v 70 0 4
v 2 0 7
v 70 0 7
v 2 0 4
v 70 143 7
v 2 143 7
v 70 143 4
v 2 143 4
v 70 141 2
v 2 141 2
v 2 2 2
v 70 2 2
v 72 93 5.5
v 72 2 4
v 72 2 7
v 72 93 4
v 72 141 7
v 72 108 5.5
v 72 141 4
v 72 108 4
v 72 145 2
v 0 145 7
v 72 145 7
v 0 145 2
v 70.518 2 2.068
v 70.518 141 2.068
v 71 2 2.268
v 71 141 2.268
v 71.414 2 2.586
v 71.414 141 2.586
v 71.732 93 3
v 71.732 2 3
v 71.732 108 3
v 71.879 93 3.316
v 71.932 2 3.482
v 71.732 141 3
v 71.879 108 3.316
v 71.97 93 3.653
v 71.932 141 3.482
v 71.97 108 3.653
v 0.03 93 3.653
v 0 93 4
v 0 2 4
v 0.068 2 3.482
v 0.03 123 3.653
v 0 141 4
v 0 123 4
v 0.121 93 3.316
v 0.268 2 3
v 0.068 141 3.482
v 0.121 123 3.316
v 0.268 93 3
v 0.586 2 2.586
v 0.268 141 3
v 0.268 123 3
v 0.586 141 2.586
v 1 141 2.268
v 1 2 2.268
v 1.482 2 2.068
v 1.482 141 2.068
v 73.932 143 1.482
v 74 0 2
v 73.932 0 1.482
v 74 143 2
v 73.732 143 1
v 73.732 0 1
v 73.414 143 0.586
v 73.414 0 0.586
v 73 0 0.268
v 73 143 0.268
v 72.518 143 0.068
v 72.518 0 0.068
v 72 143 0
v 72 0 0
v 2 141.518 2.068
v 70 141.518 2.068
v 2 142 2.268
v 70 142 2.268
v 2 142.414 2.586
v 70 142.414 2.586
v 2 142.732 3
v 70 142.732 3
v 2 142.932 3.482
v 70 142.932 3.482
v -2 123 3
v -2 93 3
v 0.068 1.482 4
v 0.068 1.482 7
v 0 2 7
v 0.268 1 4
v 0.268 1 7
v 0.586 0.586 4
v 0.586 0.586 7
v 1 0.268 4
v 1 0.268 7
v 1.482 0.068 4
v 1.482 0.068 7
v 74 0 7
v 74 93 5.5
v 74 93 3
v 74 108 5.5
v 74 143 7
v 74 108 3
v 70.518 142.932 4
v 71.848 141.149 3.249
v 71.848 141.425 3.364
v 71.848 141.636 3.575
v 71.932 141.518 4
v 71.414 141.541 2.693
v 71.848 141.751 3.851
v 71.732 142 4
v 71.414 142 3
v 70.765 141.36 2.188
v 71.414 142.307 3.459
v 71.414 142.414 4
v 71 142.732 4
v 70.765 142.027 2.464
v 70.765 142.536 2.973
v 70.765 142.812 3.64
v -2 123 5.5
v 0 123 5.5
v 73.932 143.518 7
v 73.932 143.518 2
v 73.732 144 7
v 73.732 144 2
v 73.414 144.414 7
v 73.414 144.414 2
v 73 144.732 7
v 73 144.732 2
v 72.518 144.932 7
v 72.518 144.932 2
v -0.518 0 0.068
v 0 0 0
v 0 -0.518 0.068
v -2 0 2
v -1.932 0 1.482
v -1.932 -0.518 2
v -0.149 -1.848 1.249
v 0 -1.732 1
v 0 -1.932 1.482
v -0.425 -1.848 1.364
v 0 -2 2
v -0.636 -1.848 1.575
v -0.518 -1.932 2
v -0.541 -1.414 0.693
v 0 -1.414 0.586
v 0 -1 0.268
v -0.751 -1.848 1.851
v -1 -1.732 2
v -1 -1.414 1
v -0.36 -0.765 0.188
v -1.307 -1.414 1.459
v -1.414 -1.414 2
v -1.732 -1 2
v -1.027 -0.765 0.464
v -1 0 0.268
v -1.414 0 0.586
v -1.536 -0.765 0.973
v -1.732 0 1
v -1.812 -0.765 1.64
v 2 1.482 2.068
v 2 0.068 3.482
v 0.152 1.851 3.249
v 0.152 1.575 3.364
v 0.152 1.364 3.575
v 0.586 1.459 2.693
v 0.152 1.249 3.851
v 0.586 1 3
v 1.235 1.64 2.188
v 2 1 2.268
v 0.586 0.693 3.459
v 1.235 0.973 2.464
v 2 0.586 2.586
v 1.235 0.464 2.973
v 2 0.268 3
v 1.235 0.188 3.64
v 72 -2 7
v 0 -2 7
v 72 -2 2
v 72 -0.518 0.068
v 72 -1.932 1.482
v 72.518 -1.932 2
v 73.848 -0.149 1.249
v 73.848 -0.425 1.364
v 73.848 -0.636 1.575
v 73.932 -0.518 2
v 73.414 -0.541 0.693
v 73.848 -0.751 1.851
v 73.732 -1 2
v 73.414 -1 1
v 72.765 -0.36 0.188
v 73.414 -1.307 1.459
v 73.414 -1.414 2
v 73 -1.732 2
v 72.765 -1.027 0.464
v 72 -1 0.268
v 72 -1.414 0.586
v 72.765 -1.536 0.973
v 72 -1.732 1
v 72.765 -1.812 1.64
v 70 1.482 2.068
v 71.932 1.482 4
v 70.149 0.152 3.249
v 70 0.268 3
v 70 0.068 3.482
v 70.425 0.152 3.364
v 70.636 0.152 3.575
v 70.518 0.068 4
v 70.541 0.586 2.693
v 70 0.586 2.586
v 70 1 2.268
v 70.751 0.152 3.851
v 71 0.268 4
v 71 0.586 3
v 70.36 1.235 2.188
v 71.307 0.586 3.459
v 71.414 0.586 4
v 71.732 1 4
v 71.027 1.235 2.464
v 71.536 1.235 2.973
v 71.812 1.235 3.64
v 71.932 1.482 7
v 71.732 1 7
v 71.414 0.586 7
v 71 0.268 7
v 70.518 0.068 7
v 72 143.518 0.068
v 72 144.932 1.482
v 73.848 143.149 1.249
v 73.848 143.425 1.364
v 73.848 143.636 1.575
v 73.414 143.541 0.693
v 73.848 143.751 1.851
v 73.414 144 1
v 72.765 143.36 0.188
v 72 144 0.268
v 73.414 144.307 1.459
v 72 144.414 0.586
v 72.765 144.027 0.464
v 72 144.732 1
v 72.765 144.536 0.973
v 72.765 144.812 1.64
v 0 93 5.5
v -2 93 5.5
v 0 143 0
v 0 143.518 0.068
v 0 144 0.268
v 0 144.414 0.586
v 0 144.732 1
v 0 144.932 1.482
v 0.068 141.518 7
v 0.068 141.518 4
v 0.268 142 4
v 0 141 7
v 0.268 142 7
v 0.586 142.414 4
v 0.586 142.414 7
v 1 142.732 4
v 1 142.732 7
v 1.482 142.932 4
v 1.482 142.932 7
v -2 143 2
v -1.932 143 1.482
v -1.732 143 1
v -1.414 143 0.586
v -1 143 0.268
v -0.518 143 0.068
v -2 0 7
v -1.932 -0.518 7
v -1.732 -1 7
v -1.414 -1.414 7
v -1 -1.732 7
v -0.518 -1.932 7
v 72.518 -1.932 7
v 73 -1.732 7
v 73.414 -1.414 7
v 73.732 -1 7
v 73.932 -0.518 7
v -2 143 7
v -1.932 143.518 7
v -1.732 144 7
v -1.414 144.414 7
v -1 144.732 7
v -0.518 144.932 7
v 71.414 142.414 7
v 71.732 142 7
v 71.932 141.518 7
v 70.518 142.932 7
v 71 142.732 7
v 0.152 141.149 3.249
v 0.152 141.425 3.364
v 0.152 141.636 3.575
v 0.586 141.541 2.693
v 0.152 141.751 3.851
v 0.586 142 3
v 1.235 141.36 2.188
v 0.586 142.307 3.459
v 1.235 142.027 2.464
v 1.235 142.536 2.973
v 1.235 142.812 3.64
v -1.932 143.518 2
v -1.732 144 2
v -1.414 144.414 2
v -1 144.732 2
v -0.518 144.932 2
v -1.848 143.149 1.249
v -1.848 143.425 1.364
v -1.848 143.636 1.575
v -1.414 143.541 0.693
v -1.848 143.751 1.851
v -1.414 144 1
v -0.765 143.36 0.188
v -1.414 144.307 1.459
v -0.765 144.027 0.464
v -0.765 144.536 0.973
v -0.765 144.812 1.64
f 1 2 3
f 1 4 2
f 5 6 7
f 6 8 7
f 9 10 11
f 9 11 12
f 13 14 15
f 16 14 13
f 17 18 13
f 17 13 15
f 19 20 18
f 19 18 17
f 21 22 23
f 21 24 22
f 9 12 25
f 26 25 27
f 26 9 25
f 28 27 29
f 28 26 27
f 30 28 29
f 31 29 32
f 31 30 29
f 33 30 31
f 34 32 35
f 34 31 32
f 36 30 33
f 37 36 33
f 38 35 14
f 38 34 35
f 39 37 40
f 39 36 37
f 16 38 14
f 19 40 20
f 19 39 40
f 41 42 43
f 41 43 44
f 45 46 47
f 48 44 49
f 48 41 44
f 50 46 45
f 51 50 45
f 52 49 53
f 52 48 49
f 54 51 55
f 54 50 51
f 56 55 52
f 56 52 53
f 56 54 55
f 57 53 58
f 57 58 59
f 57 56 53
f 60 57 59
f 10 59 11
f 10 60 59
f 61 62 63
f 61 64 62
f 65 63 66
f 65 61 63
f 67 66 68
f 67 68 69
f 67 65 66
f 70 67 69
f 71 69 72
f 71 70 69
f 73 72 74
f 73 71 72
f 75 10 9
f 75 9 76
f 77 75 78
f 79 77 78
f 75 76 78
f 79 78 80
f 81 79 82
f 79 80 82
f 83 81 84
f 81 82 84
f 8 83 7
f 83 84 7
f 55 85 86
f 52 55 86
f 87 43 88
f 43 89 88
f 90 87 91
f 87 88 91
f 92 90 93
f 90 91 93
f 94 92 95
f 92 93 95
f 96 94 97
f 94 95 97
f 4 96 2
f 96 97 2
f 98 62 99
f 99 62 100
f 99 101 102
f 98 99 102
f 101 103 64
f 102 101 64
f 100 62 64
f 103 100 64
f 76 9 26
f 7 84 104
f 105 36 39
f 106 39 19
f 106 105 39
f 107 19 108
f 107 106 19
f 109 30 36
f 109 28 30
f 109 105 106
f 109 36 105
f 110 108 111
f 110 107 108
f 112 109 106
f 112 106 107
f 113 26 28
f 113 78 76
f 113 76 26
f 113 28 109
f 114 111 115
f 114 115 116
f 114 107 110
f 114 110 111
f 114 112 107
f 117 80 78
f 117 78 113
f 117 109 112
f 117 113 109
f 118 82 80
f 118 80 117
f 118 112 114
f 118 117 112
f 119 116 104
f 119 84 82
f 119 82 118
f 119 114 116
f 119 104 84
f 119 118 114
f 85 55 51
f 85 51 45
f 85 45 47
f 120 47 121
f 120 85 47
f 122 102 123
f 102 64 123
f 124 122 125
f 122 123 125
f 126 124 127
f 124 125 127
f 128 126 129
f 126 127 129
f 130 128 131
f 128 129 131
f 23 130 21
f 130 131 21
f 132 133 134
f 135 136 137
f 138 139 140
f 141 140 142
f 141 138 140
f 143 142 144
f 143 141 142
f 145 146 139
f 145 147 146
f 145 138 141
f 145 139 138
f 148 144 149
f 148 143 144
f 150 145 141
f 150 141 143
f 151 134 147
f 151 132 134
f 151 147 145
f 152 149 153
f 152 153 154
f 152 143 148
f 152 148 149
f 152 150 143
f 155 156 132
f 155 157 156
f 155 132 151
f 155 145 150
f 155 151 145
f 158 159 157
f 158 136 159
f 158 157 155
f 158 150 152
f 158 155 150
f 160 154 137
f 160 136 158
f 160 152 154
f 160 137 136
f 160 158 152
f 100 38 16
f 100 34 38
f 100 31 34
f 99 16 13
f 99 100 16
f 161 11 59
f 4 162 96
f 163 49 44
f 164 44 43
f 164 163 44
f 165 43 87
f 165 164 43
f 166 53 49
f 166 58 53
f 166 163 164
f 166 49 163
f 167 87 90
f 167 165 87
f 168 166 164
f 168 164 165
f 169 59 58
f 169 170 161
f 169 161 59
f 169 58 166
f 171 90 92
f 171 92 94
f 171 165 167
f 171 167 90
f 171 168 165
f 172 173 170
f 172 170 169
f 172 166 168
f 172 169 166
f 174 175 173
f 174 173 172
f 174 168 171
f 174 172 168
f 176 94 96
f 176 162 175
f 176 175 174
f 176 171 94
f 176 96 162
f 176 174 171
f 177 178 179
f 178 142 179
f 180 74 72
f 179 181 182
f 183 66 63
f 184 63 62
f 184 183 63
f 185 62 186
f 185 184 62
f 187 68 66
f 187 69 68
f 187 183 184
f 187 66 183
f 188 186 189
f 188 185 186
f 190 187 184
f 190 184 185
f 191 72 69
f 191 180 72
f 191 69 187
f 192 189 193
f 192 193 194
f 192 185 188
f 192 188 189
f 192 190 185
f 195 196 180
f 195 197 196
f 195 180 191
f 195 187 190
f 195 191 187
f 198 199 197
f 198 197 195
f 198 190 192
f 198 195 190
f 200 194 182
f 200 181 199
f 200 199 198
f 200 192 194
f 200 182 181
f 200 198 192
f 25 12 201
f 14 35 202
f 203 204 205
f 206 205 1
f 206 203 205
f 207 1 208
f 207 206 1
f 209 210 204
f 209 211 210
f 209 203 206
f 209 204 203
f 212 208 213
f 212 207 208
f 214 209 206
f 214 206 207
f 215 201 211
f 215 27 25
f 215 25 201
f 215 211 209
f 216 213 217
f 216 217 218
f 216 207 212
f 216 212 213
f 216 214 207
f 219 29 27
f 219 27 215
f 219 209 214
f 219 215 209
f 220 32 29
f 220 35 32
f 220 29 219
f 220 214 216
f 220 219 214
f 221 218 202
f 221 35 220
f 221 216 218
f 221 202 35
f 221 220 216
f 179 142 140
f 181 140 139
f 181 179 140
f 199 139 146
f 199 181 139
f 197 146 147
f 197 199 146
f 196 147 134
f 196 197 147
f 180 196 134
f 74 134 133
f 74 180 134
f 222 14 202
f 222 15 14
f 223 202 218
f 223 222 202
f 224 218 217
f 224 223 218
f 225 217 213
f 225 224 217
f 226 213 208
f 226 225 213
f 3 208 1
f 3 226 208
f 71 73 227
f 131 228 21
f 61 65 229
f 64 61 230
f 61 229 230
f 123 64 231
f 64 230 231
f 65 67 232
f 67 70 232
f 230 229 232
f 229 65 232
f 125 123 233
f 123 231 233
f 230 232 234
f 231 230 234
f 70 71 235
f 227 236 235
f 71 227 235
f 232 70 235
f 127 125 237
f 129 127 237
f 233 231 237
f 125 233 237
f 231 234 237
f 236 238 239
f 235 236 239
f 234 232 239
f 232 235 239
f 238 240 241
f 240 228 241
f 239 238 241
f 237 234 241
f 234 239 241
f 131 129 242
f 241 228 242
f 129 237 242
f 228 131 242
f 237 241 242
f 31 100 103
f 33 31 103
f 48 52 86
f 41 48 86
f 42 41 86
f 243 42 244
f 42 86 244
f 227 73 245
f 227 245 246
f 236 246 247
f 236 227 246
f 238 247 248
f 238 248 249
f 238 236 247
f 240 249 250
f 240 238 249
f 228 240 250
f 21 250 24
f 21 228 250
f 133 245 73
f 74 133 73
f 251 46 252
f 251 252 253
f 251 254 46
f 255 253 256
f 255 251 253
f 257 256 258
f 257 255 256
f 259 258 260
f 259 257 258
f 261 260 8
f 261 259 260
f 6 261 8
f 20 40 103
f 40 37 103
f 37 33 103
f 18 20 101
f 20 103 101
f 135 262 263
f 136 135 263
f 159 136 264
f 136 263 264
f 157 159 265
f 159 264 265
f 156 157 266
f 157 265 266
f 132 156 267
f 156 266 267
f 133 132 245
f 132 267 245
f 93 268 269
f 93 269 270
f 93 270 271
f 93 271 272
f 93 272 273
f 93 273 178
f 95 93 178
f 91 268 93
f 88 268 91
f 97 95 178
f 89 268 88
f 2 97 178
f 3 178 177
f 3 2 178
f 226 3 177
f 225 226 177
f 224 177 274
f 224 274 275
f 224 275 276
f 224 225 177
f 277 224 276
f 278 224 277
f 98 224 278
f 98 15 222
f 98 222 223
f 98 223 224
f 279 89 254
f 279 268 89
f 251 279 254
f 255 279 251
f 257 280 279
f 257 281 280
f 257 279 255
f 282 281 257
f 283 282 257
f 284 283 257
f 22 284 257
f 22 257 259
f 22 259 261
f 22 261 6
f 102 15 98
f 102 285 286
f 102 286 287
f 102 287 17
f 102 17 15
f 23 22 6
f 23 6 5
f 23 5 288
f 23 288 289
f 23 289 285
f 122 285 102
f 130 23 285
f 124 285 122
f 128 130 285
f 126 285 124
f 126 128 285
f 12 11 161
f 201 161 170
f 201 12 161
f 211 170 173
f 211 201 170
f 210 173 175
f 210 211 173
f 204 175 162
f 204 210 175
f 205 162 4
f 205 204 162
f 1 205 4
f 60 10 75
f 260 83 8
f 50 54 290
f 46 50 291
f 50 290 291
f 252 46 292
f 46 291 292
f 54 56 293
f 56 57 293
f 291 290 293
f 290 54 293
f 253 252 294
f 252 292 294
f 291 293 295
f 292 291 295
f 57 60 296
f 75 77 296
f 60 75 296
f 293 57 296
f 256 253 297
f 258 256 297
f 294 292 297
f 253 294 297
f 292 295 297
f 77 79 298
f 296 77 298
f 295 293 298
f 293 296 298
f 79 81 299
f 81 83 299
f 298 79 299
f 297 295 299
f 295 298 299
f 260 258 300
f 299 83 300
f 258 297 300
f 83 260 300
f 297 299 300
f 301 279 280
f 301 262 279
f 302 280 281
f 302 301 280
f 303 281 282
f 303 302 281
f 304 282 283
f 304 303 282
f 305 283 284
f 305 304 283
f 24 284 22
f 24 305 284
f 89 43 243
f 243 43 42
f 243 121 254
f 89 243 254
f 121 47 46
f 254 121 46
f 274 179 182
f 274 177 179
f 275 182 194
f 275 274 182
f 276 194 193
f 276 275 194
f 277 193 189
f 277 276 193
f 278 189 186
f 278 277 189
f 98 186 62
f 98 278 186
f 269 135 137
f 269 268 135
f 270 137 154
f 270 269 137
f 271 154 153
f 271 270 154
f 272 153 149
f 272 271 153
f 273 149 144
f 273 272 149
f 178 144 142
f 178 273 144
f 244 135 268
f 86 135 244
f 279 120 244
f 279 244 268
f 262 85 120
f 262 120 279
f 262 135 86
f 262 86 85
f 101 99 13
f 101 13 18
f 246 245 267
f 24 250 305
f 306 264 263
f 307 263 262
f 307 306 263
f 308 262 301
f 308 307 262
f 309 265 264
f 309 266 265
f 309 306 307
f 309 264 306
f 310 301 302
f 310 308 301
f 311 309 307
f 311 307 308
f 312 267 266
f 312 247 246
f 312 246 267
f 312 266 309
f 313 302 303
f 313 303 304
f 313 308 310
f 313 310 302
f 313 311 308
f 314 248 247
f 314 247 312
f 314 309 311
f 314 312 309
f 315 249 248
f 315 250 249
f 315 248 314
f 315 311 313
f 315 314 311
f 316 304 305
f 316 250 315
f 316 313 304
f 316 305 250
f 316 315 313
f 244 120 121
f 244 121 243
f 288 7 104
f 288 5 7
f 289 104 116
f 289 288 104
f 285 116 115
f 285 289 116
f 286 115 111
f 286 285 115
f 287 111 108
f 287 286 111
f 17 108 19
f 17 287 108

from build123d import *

# Parameters (mm, degrees)
F0_W     = 76
F0_H     = 147
F0_W_2   = 72
F0_H_2   = 143
F1_DEPTH = 2
F2_W     = 76
F2_H     = 147
F2_W_2   = 72
F2_H_2   = 143
F3_DEPTH = 5
F4_R     = 2
F5_W     = 15
F5_H     = 2.5
F6_DEPTH = 5
F7_W     = 30
F7_H     = 2.5
F8_DEPTH = 25


with BuildPart() as f1:
    # F0 (on Top) → F1 (new body)
    with BuildSketch(Plane.XY):
        with Locations((36, 71.5)):
            Rectangle(F0_W, F0_H)
        with Locations((36, 71.5)):
            Rectangle(F0_W_2, F0_H_2, mode=Mode.SUBTRACT)
        with Locations((36, 71.5)):
            Rectangle(F0_W_2, F0_H_2)
    extrude(amount=F1_DEPTH)

    # F2 (on face) → F3 (join)
    with BuildSketch(Plane.XY.offset(2)):
        with Locations((36, 71.5)):
            Rectangle(F2_W, F2_H)
        with Locations((36, 71.5)):
            Rectangle(F2_W_2, F2_H_2, mode=Mode.SUBTRACT)
    extrude(amount=F3_DEPTH)

    # F4
    f4_edges = [f1.edges().sort_by_distance(p)[0] for p in [
        (36, 143, 2),
        (72, 71.5, 2),
        (36, 0, 2),
        (0, 71.5, 2),
        (36, 145, 0),
        (-2, 71.5, 0),
        (36, -2, 0),
        (74, 71.5, 0),
        (74, -2, 3.5),
        (-2, -2, 3.5),
        (-2, 145, 3.5),
        (74, 145, 3.5),
        (72, 0, 4.5),
        (0, 0, 4.5),
        (0, 143, 4.5),
        (72, 143, 4.5),
    ]]
    fillet(f4_edges, radius=F4_R)

    # F5 (on face) → F6 (cut)
    with BuildSketch(Plane.YZ.offset(74)):
        with Locations((100.5, 4.25)):
            Rectangle(F5_W, F5_H)
    extrude(amount=-F6_DEPTH, mode=Mode.SUBTRACT)

    # F7 (on face) → F8 (cut)
    with BuildSketch(Plane(origin=(-2, 0, 0), x_dir=(0, -1, 0), z_dir=(-1, 0, 0))):
        with Locations((-108, 4.25)):
            Rectangle(F7_W, F7_H)
    extrude(amount=-F8_DEPTH, mode=Mode.SUBTRACT)


solid = f1.part
